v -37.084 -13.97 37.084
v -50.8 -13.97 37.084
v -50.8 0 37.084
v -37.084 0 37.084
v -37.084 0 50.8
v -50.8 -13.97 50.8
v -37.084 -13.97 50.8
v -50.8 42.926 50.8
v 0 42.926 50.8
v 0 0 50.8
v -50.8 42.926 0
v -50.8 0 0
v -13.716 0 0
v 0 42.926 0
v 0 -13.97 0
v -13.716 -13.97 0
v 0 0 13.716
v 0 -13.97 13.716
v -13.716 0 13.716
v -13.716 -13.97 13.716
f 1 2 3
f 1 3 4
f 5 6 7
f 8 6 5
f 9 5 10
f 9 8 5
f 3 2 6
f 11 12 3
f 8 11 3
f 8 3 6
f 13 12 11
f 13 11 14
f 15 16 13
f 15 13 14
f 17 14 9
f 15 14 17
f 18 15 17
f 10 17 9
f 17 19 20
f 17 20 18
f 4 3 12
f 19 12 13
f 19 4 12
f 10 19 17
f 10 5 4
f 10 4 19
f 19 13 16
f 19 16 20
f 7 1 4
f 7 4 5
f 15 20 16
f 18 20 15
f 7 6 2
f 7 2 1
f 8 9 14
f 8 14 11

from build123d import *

# Parameters (mm, degrees)
F0_W       = 50.8
F0_H       = 50.8
F1_DEPTH   = 24.892
F2_W       = 13.716
F2_H       = 13.716
F3_DEPTH   = 13.97
F5_W       = 50.8
F5_H       = 50.8
F1_FACE1_W = 50.8
F1_FACE1_H = 50.8
F6_DEPTH   = 18.034


with BuildPart() as f1:
    # F0 (on Front) → F1 (new body)
    with BuildSketch(Plane.XZ):
        with Locations((-25.4, 25.4)):
            Rectangle(F0_W, F0_H)
    extrude(amount=-F1_DEPTH)

    # F2 (on face) → F3 (join)
    with BuildSketch(Plane.XZ):
        with Locations((-43.942, 43.942)):
            Rectangle(F2_W, F2_H)
        with Locations((-6.858, 6.858)):
            Rectangle(F2_W, F2_H)
    extrude(amount=F3_DEPTH)

    # F5 (on face) + F4 (on face) + F1_face1 (on face) → F6 (join, symmetric)
    with BuildSketch(Plane(origin=(0, 24.892, 0), x_dir=(-1, 0, 0), z_dir=(0, 1, 0))):
        with Locations((25.4, 25.4)):
            Rectangle(F5_W, F5_H)
    with BuildSketch(Plane(origin=(0, 24.892, 0), x_dir=(-1, 0, 0), z_dir=(0, 1, 0))):
        Polygon((13.716, 0), (37.084, 0), (37.084, 13.5469082743), (50.8, 13.5469082743), (50.8, 36.3148450851), (37.084, 36.3148450851), (37.084, 50.8), (13.716, 50.8), (13.716, 35.1472571492), (0, 35.1472571492), (0, 12.9631143063), (13.716, 12.9631143063), align=None)
    with BuildSketch(Plane(origin=(-25.4, 24.892, 25.4), x_dir=(1, 0, 0), z_dir=(0, 1, 0))):
        Rectangle(F1_FACE1_W, F1_FACE1_H)
    extrude(amount=F6_DEPTH, both=True)


solid = f1.part
